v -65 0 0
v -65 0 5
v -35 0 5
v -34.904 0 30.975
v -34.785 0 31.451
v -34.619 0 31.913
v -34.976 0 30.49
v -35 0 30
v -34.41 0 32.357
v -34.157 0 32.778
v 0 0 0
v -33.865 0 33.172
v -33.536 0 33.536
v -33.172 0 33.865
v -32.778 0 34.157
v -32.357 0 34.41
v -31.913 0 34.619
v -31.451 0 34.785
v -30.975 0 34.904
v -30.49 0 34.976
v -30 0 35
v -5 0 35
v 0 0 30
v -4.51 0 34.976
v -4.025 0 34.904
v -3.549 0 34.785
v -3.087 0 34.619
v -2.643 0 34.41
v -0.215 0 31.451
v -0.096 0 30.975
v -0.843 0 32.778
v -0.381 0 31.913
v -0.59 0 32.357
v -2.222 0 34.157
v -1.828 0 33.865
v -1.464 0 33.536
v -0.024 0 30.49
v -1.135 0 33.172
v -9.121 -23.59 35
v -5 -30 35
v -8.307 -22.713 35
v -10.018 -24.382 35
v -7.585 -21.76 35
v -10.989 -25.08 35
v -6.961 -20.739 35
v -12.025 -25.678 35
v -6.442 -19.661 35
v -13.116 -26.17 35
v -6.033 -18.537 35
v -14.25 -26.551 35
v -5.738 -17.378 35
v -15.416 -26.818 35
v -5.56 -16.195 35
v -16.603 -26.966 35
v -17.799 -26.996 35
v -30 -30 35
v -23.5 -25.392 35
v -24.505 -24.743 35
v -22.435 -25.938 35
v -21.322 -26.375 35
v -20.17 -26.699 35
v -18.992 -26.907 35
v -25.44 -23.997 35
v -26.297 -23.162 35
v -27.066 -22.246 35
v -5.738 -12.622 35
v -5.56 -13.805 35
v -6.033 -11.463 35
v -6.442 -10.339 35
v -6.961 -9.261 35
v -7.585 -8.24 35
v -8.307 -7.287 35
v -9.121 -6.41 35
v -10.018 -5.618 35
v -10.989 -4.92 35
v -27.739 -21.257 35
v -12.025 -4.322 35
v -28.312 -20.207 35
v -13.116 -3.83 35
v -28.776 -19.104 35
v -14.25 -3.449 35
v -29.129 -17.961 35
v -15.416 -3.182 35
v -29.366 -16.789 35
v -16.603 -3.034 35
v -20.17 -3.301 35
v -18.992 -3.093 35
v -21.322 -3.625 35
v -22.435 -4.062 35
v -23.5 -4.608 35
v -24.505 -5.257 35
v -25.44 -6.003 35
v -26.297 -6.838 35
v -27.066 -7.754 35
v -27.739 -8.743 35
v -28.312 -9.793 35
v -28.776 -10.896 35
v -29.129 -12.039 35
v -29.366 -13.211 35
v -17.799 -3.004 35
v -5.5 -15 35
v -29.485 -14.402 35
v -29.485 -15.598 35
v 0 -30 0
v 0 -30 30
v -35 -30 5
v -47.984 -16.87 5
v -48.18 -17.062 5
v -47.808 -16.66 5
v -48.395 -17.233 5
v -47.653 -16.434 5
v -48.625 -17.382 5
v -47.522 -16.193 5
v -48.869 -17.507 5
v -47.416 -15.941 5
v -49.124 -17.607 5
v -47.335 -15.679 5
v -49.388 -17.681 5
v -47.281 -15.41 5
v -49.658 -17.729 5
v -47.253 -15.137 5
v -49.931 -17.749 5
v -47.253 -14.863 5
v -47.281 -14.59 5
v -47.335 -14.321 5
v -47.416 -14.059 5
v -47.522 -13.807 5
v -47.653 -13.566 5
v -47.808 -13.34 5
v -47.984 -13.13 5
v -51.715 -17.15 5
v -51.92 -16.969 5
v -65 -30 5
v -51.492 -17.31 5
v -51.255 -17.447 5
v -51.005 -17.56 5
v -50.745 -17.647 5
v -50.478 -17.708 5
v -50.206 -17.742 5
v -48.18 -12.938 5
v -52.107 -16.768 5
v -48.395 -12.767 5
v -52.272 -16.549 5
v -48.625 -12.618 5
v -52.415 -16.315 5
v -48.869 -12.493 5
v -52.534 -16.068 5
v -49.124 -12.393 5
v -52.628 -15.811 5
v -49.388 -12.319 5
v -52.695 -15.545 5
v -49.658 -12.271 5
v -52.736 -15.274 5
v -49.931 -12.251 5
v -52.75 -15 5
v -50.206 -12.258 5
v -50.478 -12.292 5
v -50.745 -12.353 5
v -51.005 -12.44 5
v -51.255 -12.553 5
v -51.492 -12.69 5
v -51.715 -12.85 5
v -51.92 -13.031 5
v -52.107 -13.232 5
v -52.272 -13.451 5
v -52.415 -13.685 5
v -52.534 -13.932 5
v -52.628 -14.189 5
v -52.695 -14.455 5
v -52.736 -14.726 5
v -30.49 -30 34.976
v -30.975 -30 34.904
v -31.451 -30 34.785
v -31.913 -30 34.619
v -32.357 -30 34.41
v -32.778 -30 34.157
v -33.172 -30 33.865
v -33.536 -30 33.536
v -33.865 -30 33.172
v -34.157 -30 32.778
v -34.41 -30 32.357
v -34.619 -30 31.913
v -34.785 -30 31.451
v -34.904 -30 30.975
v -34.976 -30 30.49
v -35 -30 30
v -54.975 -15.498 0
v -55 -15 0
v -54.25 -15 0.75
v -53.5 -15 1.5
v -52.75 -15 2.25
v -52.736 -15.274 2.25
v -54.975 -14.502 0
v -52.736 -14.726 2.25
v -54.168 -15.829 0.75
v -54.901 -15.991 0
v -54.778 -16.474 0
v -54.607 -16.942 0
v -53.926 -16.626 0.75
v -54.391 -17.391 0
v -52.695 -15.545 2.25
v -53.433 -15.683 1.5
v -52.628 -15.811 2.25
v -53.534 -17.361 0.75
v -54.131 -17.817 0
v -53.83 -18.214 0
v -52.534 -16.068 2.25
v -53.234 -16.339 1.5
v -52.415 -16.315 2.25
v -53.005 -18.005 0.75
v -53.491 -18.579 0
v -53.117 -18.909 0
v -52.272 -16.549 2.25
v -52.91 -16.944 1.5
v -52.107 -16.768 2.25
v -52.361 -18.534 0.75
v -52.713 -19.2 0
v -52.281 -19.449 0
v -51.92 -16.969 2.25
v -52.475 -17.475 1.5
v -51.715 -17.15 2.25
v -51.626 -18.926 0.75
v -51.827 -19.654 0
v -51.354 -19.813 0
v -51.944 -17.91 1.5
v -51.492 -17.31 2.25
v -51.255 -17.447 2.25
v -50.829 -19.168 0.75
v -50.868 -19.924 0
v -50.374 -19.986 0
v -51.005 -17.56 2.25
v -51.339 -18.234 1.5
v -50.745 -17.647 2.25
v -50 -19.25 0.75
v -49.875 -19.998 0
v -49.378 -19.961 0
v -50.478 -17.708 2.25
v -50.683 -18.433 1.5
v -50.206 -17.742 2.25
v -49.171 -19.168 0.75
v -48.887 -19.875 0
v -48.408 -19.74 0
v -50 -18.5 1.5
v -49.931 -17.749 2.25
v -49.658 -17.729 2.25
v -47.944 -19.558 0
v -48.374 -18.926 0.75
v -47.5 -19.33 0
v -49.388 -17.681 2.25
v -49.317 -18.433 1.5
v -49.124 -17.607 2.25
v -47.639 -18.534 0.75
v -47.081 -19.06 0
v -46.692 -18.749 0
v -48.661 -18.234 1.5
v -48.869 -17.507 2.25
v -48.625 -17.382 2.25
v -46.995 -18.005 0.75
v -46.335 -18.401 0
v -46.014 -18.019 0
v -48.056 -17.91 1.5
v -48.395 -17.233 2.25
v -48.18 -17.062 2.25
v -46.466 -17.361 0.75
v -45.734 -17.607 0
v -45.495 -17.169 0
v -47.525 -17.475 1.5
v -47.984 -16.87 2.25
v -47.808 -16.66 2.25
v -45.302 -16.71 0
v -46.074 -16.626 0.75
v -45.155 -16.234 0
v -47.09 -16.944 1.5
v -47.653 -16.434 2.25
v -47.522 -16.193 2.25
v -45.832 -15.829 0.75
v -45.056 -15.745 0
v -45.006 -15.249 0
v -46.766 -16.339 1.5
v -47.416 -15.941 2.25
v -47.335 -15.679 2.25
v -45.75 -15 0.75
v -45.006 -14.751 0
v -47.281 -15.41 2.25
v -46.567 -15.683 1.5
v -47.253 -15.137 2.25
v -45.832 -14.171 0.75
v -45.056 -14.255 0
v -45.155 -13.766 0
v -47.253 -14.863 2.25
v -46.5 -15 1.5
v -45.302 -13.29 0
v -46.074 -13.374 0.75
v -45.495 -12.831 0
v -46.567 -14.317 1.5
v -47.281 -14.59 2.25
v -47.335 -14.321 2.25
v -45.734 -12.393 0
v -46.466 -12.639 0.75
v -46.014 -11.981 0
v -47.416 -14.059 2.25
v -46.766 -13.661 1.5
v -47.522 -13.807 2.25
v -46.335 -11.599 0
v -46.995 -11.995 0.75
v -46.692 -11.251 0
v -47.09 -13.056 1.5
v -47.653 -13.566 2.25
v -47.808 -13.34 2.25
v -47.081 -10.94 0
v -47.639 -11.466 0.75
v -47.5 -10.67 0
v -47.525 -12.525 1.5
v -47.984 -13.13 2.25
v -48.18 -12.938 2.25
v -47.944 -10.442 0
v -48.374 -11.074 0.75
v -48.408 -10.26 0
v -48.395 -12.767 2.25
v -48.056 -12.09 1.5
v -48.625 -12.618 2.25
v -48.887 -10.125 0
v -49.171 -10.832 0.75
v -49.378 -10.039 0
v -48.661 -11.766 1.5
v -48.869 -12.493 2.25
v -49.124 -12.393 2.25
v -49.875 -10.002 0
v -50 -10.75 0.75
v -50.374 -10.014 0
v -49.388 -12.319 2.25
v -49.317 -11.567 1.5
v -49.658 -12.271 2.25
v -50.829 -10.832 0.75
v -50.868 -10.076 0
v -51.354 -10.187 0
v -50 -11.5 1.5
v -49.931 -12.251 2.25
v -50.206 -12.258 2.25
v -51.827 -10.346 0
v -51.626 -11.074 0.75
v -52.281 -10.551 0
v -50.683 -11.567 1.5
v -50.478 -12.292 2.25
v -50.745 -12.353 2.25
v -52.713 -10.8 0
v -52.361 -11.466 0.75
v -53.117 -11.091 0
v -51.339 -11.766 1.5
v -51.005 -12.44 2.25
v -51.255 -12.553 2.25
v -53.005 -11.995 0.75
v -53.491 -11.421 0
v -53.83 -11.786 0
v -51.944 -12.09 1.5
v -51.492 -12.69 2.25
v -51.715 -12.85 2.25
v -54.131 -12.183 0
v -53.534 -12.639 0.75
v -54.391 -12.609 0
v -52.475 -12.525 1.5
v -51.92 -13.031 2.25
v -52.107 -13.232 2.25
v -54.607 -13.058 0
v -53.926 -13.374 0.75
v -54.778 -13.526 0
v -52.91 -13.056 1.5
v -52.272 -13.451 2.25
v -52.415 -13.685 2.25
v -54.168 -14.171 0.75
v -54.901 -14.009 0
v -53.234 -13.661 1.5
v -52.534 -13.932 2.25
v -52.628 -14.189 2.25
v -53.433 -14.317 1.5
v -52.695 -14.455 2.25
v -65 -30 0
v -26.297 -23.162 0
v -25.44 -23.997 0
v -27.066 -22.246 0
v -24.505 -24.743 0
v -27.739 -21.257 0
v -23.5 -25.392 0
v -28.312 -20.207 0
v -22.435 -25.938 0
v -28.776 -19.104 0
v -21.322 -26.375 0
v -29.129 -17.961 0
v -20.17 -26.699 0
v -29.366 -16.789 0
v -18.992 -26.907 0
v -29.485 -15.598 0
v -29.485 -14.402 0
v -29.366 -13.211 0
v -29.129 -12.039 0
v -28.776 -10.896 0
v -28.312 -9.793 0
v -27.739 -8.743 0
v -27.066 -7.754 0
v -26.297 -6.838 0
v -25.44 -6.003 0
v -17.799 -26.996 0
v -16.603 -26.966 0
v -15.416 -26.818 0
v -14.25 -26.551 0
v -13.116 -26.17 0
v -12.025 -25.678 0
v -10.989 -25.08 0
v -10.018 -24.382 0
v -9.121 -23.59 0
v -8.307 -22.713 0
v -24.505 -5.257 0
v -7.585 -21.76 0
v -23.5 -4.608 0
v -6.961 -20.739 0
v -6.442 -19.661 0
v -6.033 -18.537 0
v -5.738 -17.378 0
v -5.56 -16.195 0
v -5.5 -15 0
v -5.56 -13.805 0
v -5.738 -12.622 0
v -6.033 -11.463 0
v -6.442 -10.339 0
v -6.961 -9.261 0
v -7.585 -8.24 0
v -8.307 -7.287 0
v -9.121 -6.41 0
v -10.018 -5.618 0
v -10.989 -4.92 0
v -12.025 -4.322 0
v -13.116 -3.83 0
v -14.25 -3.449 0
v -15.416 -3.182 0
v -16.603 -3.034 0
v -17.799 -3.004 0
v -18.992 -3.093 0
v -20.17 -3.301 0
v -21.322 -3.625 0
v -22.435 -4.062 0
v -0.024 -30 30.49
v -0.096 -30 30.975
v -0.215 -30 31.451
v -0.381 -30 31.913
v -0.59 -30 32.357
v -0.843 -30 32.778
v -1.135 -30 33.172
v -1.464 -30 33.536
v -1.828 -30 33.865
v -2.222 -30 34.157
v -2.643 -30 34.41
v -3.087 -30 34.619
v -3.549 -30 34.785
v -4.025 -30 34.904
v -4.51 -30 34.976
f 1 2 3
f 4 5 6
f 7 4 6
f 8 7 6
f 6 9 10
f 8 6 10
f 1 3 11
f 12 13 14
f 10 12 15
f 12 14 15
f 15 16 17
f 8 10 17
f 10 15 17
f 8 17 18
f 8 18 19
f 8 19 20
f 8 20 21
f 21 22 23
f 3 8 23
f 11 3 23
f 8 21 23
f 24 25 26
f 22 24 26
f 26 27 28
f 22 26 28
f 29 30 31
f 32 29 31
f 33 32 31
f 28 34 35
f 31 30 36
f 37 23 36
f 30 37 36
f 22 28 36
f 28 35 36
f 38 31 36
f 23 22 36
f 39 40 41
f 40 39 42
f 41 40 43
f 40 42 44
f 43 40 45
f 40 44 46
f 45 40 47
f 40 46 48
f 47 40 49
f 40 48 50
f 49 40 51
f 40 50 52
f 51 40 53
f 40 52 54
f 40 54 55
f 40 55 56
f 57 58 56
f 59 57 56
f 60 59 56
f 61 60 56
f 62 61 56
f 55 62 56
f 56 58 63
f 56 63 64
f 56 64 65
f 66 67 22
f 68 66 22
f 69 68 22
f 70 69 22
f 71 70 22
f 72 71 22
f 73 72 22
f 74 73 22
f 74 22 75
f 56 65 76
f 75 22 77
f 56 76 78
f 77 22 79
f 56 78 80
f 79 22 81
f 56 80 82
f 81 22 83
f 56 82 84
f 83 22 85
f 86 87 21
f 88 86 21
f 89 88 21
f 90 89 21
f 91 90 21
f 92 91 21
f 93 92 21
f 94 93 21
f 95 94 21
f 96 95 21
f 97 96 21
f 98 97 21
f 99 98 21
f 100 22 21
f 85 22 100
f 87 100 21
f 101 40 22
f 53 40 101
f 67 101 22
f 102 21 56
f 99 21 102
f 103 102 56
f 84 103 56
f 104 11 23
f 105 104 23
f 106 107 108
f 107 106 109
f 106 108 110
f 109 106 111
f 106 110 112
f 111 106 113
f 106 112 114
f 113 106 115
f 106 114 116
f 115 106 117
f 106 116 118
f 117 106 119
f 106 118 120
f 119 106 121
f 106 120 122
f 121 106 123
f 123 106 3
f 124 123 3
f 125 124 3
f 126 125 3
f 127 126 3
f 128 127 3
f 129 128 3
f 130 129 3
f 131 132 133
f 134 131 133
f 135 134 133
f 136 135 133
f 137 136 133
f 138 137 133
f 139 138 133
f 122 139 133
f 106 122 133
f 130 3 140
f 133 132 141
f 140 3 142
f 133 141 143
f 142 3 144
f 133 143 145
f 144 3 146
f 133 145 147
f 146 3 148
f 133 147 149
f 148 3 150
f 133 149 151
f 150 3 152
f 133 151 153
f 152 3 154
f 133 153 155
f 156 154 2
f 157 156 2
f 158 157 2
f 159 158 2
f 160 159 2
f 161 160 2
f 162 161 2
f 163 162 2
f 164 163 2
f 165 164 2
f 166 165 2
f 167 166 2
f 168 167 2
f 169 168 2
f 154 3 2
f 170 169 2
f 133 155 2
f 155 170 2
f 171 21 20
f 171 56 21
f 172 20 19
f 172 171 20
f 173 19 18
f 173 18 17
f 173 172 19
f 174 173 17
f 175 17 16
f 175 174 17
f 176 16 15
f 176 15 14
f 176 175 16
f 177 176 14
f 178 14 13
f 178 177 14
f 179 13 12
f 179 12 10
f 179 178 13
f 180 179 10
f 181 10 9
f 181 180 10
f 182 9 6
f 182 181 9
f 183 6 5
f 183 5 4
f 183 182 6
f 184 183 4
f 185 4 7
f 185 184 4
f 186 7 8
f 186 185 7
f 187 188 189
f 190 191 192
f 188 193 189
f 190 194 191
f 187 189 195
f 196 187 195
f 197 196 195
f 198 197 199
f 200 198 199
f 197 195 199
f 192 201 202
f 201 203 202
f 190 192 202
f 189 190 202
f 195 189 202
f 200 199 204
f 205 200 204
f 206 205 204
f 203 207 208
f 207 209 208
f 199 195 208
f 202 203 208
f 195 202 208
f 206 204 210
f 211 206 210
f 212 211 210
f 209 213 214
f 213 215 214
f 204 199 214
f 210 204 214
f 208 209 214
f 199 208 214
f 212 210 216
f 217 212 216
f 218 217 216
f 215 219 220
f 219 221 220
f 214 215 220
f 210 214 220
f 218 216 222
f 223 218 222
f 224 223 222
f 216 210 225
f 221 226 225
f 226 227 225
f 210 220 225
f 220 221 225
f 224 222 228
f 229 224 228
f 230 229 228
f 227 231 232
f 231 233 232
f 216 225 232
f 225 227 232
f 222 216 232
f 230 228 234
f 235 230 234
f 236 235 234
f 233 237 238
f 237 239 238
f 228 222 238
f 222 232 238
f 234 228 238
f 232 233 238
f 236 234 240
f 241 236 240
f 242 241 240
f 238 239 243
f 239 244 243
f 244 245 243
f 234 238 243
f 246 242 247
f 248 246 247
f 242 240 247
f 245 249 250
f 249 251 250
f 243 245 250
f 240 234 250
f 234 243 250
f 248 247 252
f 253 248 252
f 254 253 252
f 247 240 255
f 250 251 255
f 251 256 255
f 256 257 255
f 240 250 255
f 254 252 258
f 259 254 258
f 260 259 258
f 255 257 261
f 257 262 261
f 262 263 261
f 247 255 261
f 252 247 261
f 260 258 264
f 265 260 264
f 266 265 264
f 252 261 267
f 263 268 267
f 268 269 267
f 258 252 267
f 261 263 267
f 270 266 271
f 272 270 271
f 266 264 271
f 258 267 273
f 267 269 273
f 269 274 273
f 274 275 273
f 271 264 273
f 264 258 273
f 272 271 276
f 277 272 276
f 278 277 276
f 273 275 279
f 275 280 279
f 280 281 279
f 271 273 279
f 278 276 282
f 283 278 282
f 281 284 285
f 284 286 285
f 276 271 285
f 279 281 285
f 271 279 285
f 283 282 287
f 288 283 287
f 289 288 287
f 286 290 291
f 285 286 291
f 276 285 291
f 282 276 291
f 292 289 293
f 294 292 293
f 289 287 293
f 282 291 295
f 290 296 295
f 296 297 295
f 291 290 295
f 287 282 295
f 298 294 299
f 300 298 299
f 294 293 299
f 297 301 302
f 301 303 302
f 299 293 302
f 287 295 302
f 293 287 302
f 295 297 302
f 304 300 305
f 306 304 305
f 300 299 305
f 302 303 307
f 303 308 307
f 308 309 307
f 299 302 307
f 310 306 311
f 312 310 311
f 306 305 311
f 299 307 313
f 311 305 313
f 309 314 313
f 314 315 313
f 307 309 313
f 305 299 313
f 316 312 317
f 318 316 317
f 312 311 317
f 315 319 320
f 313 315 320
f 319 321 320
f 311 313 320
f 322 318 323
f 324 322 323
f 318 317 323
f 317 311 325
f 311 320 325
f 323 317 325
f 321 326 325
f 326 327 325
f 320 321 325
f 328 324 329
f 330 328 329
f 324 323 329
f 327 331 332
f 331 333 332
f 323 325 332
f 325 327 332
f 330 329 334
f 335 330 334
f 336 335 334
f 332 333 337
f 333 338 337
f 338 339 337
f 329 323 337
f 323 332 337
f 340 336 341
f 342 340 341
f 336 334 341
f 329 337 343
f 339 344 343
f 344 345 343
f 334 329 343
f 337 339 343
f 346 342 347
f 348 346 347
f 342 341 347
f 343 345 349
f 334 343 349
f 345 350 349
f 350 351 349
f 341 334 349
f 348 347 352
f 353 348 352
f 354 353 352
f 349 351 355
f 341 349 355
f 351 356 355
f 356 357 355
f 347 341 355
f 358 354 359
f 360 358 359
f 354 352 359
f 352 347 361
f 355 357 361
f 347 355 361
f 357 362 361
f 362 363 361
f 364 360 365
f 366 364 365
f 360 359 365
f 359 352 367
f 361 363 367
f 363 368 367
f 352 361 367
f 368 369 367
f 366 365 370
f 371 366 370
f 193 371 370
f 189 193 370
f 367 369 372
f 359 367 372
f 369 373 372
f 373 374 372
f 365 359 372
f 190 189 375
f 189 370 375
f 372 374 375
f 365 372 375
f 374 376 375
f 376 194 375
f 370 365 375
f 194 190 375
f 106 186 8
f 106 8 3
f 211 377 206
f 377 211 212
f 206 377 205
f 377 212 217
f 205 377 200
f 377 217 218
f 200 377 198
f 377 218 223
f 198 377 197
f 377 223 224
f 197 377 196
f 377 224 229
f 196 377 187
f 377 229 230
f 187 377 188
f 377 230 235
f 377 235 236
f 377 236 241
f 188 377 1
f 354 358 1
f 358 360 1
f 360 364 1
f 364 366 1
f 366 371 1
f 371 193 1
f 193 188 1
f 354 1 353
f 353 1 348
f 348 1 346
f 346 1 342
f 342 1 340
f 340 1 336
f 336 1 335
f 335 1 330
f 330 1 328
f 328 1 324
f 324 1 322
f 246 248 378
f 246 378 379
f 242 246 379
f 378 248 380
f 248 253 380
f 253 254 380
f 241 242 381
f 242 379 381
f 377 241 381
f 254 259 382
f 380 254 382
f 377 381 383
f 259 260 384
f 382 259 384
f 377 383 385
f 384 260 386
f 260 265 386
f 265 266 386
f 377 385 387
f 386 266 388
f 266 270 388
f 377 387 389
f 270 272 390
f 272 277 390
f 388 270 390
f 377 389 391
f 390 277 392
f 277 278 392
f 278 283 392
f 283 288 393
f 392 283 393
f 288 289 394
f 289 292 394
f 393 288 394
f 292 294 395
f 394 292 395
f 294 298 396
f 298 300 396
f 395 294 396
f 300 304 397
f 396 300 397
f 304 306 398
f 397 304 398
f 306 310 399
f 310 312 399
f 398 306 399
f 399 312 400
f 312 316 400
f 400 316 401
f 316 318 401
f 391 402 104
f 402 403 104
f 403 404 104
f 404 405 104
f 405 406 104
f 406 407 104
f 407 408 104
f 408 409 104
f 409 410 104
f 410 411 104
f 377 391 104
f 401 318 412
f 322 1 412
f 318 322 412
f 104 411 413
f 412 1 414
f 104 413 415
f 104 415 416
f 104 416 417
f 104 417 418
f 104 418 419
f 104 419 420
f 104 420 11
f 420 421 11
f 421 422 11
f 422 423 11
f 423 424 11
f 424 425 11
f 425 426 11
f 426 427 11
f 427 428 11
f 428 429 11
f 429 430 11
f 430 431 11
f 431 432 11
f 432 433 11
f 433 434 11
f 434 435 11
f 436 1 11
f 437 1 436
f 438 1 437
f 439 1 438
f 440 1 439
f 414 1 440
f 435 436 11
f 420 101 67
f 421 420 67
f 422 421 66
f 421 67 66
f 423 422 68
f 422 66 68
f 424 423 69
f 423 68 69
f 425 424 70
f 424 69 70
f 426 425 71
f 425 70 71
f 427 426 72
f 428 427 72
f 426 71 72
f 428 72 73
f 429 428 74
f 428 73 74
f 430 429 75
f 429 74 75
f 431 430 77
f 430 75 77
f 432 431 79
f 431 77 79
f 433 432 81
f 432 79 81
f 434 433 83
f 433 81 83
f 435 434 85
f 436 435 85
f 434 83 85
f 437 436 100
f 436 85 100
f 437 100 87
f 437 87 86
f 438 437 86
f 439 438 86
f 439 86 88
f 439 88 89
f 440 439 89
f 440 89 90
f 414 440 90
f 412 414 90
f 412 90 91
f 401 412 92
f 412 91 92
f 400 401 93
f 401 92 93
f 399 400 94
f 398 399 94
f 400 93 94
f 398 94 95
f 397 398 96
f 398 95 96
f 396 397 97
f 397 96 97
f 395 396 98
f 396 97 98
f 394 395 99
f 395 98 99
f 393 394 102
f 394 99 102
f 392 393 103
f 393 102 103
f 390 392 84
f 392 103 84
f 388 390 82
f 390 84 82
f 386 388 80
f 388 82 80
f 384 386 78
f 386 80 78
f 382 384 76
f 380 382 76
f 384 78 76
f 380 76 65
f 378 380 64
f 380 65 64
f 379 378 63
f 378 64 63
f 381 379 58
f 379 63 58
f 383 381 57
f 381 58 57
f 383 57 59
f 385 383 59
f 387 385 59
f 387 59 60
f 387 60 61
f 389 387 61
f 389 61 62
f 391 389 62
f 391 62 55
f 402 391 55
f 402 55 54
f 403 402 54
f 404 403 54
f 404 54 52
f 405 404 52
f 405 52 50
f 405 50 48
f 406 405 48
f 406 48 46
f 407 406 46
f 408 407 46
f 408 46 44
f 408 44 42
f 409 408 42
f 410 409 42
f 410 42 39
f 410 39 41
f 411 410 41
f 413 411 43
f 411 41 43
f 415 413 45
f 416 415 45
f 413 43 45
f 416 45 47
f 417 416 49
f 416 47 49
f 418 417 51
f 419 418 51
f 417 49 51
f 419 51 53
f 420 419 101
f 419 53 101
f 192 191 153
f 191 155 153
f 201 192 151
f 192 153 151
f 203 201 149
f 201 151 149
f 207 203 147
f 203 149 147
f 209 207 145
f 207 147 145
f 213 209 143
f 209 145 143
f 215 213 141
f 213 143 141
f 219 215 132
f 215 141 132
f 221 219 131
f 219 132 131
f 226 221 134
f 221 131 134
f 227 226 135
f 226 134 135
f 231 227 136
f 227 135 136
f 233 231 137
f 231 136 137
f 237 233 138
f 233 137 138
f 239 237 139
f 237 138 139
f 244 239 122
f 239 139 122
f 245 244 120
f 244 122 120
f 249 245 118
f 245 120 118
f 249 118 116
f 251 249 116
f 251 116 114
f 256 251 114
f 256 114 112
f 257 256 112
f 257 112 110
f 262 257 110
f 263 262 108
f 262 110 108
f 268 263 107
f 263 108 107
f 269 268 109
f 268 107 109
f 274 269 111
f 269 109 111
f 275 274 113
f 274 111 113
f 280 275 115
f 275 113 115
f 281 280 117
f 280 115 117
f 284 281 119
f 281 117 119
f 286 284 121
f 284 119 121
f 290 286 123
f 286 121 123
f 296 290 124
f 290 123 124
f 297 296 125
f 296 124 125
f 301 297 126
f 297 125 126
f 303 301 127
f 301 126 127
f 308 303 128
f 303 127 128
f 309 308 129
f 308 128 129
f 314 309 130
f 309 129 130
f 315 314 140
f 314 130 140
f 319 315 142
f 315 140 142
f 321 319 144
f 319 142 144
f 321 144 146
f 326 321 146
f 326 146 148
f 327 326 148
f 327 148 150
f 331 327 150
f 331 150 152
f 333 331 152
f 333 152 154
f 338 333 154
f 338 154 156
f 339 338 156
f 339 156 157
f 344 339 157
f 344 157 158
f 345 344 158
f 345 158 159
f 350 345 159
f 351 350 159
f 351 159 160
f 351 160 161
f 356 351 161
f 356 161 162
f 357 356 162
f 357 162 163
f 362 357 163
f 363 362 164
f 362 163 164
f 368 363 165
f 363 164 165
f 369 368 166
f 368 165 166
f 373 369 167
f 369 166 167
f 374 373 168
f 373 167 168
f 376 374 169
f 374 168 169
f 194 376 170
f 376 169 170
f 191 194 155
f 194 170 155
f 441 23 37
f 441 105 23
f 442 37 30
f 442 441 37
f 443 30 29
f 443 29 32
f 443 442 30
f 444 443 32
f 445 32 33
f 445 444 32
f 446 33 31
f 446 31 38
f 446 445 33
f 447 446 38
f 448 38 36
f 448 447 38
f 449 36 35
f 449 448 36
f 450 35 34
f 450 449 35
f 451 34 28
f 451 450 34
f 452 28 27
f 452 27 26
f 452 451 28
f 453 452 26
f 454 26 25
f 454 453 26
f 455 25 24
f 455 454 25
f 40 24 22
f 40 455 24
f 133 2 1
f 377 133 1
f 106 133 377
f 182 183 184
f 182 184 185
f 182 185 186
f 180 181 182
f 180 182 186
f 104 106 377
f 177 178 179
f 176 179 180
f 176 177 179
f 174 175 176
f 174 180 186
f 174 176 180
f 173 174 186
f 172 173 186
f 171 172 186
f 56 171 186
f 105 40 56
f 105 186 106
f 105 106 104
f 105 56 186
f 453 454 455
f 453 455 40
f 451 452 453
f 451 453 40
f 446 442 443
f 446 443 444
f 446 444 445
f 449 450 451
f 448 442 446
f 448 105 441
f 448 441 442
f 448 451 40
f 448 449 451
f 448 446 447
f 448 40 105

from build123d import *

# Parameters (mm, degrees)
F1_DEPTH       = 30
F3_R           = 12
F4_DEPTH       = 35
F5_R           = 5
F7_D           = 5.5
F7_DEPTH       = 16
F7_CSINK_D     = 10
F7_CSINK_ANGLE = 90


with BuildPart() as f1:
    # F0 (on Front) → F1 (new body)
    with BuildSketch(Plane.XZ):
        Polygon((-65, 0), (0, 0), (0, 35), (-35, 35), (-35, 5), (-65, 5), align=None)
    extrude(amount=F1_DEPTH)

    # F3 (on face) → F4 (cut, through all)
    with BuildSketch(Plane.XY.offset(35)):
        with Locations((-17.5, -15)):
            Circle(F3_R)
    extrude(amount=-F4_DEPTH, mode=Mode.SUBTRACT)

    # F5
    f5_edges = [f1.edges().sort_by_distance(p)[0] for p in [
        (0, -15, 35),
        (-35, -15, 35),
    ]]
    fillet(f5_edges, radius=F5_R)

    # F7
    with Locations(Plane(origin=(0, 0, 0), x_dir=(1, 0, 0), z_dir=(0, 0, -1))):
        with Locations((-50, 15)):
            CounterSinkHole(F7_D / 2, F7_CSINK_D / 2, depth=F7_DEPTH, counter_sink_angle=F7_CSINK_ANGLE)


solid = f1.part
